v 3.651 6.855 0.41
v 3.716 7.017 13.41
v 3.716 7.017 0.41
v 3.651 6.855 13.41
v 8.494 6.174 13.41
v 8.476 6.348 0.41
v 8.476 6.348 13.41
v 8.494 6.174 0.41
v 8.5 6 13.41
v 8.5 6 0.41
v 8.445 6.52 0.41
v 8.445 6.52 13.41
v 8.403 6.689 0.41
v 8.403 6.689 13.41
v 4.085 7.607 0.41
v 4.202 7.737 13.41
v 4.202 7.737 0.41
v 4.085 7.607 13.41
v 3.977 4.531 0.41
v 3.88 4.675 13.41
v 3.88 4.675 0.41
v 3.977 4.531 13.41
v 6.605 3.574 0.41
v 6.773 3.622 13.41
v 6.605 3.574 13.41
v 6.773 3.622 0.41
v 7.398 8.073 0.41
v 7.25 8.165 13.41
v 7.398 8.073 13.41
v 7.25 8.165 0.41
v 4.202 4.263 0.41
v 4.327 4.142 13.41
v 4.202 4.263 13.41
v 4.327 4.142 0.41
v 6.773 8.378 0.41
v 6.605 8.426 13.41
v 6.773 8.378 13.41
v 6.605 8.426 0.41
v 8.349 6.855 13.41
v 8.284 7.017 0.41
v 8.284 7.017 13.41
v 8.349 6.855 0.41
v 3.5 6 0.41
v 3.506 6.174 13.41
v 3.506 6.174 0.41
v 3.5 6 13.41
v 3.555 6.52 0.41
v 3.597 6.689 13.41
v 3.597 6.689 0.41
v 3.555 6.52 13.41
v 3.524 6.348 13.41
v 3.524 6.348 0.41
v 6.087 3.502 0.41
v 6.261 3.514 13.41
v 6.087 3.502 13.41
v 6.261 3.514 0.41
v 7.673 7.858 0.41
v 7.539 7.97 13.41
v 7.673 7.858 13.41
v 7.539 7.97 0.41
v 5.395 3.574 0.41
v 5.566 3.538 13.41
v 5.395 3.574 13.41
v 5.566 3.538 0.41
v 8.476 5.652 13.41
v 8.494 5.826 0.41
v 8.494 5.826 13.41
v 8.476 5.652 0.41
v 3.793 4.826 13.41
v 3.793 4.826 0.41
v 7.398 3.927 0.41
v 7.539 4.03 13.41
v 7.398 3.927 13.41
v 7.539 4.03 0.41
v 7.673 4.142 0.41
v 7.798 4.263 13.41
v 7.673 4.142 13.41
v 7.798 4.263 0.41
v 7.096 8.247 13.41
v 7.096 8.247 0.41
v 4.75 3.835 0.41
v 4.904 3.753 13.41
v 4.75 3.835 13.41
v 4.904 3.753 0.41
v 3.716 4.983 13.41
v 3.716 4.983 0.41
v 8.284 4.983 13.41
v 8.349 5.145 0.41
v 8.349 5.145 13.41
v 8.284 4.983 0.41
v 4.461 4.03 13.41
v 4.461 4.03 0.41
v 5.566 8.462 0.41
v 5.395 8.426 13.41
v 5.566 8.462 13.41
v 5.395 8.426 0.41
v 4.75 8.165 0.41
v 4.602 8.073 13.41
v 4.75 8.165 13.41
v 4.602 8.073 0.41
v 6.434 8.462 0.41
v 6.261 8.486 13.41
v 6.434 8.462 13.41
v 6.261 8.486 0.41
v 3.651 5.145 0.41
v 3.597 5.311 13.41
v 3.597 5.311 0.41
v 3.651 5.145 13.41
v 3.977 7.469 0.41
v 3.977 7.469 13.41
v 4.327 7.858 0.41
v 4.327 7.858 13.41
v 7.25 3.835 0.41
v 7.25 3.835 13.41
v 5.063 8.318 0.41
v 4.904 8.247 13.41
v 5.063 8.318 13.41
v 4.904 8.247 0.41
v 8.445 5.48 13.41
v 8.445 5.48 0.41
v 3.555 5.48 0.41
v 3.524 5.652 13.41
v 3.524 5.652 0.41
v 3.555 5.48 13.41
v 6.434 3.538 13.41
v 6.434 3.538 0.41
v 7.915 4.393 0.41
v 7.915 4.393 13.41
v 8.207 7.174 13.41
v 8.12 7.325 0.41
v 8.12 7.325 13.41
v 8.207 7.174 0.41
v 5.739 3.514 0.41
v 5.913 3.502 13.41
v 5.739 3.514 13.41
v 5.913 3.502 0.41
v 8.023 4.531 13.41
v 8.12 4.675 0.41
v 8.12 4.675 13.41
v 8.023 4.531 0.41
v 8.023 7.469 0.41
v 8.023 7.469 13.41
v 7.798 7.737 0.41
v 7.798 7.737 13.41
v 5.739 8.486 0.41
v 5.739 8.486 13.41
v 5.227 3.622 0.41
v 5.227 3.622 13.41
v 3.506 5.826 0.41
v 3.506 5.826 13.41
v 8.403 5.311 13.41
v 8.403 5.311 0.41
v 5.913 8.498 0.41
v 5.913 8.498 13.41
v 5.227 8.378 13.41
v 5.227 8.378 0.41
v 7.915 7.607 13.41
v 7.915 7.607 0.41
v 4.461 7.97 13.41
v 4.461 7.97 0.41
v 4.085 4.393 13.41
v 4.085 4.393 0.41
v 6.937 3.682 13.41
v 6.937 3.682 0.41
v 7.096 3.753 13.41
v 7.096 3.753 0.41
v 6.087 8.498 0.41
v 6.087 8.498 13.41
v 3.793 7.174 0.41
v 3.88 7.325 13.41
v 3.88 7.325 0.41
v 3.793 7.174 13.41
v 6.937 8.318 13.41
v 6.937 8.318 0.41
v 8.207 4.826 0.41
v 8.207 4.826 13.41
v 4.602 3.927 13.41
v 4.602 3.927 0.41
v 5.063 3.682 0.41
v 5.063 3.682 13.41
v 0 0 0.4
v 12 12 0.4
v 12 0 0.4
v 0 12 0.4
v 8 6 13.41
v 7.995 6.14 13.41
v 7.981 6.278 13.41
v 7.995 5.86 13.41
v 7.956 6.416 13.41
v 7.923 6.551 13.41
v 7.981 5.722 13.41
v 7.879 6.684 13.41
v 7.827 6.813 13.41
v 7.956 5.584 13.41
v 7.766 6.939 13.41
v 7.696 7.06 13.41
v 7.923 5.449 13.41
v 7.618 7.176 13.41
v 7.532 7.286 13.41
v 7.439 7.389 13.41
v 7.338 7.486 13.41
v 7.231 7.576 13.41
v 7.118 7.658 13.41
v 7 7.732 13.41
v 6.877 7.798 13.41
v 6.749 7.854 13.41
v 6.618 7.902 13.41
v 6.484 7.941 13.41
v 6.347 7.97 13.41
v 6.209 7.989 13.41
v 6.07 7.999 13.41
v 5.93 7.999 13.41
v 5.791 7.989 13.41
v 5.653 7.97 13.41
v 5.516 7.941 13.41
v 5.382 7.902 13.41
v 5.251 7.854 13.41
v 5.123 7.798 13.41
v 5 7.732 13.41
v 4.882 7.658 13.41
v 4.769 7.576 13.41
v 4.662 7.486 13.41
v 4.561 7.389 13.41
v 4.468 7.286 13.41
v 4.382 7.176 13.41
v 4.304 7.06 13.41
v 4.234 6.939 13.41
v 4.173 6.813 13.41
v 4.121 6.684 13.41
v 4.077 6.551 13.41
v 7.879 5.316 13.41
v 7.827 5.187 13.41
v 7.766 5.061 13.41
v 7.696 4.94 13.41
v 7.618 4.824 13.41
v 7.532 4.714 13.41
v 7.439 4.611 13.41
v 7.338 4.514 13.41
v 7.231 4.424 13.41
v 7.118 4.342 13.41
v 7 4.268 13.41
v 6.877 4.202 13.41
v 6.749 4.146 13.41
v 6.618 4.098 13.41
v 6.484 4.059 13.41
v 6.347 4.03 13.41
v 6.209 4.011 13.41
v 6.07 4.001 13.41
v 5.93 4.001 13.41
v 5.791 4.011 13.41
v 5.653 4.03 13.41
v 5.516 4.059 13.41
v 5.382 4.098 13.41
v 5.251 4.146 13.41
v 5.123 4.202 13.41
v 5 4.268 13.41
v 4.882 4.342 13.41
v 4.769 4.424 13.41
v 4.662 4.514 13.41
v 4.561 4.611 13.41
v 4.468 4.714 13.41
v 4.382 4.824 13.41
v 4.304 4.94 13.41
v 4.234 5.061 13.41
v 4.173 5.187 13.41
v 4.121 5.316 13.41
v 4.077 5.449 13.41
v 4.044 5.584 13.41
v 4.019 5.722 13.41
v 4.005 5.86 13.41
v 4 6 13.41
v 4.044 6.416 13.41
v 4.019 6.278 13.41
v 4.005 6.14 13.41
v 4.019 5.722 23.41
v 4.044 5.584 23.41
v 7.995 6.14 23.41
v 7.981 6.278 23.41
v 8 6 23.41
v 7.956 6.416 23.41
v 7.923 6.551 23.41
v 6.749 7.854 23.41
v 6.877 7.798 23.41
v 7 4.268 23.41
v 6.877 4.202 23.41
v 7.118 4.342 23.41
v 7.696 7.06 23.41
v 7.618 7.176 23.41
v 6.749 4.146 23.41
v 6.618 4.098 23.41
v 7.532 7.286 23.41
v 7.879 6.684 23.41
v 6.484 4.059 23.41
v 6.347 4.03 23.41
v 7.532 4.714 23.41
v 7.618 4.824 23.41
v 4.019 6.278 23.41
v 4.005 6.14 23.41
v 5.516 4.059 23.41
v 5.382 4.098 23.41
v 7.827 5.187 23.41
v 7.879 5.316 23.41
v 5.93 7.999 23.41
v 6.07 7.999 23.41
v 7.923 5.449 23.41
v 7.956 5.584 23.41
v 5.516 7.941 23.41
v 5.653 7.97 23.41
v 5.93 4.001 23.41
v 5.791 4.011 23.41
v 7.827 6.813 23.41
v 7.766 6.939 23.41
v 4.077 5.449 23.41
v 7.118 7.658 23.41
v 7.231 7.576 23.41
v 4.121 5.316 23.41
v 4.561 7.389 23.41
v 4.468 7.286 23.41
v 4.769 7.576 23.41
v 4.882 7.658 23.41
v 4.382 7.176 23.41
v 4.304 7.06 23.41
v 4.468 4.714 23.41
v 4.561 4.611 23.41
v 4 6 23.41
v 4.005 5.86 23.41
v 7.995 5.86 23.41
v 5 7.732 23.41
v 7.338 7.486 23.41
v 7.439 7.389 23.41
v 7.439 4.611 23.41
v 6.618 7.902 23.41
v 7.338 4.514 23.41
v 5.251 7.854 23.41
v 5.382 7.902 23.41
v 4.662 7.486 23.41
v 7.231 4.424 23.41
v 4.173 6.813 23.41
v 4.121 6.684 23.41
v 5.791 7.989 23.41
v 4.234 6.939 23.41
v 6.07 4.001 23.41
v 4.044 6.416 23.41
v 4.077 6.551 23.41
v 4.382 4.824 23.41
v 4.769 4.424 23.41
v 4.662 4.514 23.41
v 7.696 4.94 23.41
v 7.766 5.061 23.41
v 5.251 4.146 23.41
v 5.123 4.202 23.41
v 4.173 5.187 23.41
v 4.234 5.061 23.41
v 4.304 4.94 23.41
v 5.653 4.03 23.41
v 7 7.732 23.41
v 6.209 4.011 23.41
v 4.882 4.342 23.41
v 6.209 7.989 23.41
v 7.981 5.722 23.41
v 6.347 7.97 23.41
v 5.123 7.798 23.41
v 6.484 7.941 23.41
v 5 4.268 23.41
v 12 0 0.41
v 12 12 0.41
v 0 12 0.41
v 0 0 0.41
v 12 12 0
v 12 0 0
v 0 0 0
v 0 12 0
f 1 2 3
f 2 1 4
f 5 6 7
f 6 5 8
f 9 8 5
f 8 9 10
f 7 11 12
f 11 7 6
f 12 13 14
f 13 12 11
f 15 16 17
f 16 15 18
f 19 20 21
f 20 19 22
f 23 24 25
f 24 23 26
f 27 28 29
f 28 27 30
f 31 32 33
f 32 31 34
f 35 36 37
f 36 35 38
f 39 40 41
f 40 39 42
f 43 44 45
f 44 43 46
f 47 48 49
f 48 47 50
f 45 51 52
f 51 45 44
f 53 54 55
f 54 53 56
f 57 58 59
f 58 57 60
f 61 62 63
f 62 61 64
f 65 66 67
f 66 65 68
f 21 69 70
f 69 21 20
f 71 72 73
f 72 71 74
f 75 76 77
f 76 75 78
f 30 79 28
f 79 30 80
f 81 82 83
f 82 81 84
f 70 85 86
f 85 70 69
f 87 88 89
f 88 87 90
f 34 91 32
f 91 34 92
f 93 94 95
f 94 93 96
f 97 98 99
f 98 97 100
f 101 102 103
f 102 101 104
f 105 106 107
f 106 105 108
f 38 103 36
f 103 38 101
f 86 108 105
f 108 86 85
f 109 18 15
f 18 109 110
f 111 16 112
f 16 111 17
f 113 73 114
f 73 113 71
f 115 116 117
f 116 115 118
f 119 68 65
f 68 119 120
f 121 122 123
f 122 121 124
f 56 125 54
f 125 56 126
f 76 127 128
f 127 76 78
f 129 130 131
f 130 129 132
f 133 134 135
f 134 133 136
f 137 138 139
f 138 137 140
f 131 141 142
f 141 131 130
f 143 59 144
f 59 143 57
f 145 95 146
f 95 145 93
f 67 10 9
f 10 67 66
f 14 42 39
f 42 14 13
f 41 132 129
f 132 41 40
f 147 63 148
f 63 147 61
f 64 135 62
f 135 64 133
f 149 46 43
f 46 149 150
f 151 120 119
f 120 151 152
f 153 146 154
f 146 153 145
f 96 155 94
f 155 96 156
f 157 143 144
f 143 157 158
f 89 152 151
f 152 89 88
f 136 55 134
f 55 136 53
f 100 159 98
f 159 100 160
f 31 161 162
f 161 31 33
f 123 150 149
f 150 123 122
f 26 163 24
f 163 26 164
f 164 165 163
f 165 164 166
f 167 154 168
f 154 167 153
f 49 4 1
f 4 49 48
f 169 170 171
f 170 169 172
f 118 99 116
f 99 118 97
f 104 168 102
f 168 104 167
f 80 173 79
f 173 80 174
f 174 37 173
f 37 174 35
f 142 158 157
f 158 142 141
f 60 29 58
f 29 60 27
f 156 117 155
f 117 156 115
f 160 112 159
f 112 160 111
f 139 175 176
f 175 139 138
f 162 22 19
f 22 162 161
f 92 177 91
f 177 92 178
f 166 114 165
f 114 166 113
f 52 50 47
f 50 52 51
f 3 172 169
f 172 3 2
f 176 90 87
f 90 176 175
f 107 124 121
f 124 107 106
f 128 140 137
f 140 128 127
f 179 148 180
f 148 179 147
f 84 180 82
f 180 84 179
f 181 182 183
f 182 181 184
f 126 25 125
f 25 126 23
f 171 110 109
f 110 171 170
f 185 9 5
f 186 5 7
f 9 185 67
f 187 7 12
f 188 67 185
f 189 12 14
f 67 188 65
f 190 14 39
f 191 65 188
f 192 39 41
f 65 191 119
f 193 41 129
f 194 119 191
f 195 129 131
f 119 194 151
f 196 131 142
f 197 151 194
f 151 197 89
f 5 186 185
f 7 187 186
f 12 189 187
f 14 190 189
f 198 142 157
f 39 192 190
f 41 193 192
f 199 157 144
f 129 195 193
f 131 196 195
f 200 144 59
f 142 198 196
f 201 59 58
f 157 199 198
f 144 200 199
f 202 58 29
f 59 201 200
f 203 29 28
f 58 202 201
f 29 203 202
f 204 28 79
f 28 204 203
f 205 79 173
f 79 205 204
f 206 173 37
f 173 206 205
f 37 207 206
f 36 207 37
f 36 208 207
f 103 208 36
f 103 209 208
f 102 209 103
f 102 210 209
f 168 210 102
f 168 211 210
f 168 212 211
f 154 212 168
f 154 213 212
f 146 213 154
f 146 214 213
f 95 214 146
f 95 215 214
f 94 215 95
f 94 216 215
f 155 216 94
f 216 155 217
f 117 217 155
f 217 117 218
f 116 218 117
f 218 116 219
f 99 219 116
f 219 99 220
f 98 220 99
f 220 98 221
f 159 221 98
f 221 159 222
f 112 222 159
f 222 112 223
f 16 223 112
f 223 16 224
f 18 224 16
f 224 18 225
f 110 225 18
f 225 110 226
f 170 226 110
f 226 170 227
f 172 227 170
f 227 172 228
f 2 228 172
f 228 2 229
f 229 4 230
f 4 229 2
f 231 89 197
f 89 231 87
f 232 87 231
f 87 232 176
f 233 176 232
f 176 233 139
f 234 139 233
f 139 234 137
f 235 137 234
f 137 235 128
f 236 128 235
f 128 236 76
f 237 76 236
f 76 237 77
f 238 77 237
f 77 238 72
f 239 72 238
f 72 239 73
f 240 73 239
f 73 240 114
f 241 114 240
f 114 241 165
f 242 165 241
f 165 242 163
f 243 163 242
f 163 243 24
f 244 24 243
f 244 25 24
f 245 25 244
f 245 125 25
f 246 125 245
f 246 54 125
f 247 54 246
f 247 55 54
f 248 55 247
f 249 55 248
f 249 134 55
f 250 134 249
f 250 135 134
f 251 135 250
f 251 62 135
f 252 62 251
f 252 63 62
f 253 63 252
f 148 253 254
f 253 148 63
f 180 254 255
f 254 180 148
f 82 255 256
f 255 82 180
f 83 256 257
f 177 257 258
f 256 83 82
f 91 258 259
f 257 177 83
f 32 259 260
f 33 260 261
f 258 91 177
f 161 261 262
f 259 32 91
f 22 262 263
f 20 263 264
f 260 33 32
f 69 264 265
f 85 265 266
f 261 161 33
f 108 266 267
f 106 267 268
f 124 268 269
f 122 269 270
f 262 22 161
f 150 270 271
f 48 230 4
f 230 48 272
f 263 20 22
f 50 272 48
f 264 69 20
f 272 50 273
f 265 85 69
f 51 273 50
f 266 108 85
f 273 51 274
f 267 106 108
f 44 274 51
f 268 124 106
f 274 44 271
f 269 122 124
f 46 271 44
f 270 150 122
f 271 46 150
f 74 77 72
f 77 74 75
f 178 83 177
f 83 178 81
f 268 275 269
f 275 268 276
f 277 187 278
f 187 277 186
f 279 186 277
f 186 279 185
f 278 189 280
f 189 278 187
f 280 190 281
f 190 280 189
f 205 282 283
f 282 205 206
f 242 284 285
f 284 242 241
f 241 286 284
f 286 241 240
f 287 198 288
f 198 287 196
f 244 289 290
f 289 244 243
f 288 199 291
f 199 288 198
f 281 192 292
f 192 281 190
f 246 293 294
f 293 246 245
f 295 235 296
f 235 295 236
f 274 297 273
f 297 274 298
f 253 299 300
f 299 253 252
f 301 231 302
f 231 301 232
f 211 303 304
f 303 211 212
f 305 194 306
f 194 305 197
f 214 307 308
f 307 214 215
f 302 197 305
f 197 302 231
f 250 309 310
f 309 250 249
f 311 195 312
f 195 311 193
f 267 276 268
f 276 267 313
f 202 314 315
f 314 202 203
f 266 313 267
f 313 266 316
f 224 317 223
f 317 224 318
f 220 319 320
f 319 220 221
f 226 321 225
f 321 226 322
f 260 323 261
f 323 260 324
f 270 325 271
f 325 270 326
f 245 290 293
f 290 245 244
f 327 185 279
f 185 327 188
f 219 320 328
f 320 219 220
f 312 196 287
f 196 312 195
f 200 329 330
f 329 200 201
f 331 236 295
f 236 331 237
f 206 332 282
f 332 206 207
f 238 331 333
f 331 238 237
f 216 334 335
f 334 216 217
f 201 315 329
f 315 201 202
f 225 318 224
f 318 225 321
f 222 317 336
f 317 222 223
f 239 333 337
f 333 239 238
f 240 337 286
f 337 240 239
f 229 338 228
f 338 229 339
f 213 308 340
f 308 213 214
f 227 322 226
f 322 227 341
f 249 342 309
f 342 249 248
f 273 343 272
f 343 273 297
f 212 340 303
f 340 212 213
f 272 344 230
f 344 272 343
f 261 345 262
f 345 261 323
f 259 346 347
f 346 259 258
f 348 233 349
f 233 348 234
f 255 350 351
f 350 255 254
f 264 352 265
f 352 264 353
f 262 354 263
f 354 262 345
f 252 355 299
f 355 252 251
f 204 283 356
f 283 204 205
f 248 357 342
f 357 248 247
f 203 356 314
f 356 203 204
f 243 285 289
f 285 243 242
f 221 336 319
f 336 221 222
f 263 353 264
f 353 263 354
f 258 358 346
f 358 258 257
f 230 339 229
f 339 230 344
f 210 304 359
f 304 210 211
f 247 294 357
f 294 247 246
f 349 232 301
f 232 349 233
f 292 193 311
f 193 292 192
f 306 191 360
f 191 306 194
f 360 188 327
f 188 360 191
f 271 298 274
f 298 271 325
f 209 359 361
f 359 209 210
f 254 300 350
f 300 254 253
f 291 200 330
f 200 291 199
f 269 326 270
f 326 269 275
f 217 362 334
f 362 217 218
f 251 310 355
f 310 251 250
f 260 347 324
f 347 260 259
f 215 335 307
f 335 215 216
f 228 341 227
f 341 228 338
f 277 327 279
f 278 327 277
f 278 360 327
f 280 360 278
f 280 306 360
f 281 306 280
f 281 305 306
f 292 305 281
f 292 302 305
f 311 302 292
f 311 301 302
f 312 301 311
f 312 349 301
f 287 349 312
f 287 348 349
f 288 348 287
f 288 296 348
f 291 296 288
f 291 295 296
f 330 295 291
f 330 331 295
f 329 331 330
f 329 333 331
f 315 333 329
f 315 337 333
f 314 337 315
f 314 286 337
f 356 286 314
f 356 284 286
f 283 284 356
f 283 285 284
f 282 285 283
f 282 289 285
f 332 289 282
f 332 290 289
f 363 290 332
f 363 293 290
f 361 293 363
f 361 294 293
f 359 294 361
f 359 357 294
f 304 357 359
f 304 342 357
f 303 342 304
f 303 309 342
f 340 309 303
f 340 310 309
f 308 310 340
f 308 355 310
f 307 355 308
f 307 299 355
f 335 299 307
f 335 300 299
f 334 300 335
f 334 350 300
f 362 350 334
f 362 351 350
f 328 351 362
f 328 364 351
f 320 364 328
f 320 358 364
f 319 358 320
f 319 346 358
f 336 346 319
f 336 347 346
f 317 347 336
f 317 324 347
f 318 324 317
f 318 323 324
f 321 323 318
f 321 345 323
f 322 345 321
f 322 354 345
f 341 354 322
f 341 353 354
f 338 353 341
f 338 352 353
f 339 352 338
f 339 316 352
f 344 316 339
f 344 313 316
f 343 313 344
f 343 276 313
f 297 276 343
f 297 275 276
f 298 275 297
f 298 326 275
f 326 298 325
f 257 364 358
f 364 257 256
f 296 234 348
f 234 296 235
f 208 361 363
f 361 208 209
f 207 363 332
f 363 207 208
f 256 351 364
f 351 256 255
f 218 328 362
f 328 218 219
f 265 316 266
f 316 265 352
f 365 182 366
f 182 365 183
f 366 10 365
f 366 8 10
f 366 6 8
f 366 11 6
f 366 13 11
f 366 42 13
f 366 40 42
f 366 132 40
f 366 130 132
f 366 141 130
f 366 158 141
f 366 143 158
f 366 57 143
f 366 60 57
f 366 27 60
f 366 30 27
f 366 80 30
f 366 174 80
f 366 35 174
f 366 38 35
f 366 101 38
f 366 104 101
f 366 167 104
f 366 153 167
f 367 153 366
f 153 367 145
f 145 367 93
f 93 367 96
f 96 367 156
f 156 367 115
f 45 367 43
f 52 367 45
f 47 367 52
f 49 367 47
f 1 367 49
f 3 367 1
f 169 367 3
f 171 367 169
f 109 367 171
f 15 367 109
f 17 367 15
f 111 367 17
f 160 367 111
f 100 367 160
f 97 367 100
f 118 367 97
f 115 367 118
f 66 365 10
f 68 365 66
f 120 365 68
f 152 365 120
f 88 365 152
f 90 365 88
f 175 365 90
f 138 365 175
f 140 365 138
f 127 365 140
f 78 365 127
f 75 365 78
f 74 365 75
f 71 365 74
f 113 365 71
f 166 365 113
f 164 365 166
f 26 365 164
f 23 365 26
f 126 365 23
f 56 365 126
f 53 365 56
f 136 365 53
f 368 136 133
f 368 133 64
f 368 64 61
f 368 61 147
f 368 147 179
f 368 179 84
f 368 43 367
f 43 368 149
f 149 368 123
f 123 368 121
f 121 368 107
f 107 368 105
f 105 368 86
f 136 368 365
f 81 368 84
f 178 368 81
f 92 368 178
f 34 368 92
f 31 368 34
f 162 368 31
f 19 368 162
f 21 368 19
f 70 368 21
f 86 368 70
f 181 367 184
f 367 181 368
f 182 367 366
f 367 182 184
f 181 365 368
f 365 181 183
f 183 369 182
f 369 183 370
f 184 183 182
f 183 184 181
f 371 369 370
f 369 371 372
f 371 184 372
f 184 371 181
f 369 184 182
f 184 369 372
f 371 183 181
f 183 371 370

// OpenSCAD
// file: ../../Base/Boxes.scad
// Fischertechnik Box Foundation
// Pre-designed Boxes

use <Constants.scad>

include <PlacementOptions.scad>

box190Width = 190;
box190Depth = 130;
box130Width = 130;
box130Depth = 95;
boxUsageHeight = 33.9;
boxWallThickness = 2.4;
boxBaseThickness = 1.0;
boxWebWidth = 3.0;

// getBoxWallThickness()
// Gets the wall thickness of a Fischertechnik Box

function getBoxWallThickness() = boxWallThickness;

// Gets the usable height of a fischertechnik box
function getBoxUsageHeight() = boxUsageHeight;

// Gets the thickness of the Fischertechnik box base.
function getBoxBaseThickness() = boxBaseThickness;

// Gets the width of a box web
function getBoxWebWidth() = boxWebWidth;

// Gets the usable inner space of a Box 190 as an x/y-list
function getBox190Space() = [
    box190Width - 2*getBoxWallThickness(), 
    box190Depth - 2*getBoxWallThickness() ];

// Imports the Fischertechnik empty box 130x190 mm and places it at position 0,0
// 190x130 are the outer sizes, the inner space is slightly smaller. Use getBox190Space() to get the inner sizes.
// This module needs the STL file "Fischertechnik Box 130x190.stl" in the library path.
// The box is positioned that the usable inner space is at the 0,0,0 position. The

module Box190() {
    translate([-getBoxWallThickness(),-getBoxWallThickness(),-getBoxBaseThickness()])
        import("Fischertechnik Box 130x190.stl", convexity=3);
}

// Gets the usable inner space of a Box 130 as an x/y-list
function getBox130Space() = [
    box130Width - 2*getBoxWallThickness(), 
    box130Depth - 2*getBoxWallThickness() ];

// Imports the Fischertechnik empty box 95x130 mm and places it at position 0,0
// 190x130 are the outer sizes, the inner space is slightly smaller. Use getBox190Space() to get the inner sizes.
// This module needs the STL file "Fischertechnik Box 95x130.stl" in the library path.
// The box is positioned that the usable inner space is at the 0,0,0 position. The

module Box130() {
    translate([-getBoxWallThickness(),-getBoxWallThickness(),-getBoxBaseThickness()])
        import("Fischertechnik Box 95x130.stl", convexity=3);
}

// Creates a web at the specified box walls
// corner 0 = LowerLeft, 1 = UpperLeft, 2 = UpperRight, 3 = LowerRight
// side 0 = LeftOfCorner, 1 = RightOfCorner
// distance = Distance in mm from the corner
// box = inner width and depth of the box (default: Box 190)
// webWidth = length of the web (default is 3 mms)
// webThickness = thickness of the web (default is 1 mm)

module BoxWeb(corner, side, distance, box=getBox190Space(), webWidth=getBoxWebWidth(), webThickness=1.0) {
    sink = getBoxWallThickness()/2;

    width = (corner % 2 == 0) ? 
            (side == LeftOfCorner ? webWidth : webThickness) :
            (side == LeftOfCorner ? webThickness : webWidth);

    depth = (corner % 2 == 0) ? 
            (side == RightOfCorner ? webWidth : webThickness) :
            (side == RightOfCorner ? webThickness : webWidth);
    
    xDiff = corner == LowerLeft ? 
                (side == LeftOfCorner ? -sink : distance) :
            (corner == UpperLeft ?                
                (side == LeftOfCorner ? distance : -sink) :
            (corner == UpperRight ?
                (side == LeftOfCorner ? box.x-webWidth+sink : box.x-distance-webThickness) :
                (side == LeftOfCorner ? box.x-distance-webThickness: box.x-webWidth+sink)));

    yDiff = corner == LowerLeft ? 
                (side == RightOfCorner ? -sink : distance) :
            (corner == UpperLeft ?
                (side == RightOfCorner ? box.y-distance : box.y-webWidth+sink) :
            (corner == UpperRight ?
                (side == RightOfCorner ? box.y-webWidth+sink : box.y-distance) :
                (side == RightOfCorner ? distance : -sink)));
    
    translate([xDiff, yDiff, -getExcess()])
        cube([width, depth, boxUsageHeight + 2*getExcess()]);
}
// file: ../../Base/Rotation.scad
// Fischertechnik Box Foundation
// Geometry Helpers Rotation

include <PlacementOptions.scad>

// getRotatedSpace(space, rotation=NoRotation)
// Rotates the space dependent on the specified rotation

function getRotatedSpace(space, rotation=NoRotation) = [
    (rotation == Rotate90 || rotation == Rotate270) ? space.y : space.x,
    (rotation == Rotate90 || rotation == Rotate270) ? space.x : space.y
];

// Rotates the given space around the fixed left lower corner
// space = the space the children needs as width/depth list [width,depth]
// rotation = 0 Rotate0 degrees, 1 Rotate90 degrees, 2 Rotate180 degrees, 3 Rotate270 degrees (equivalent to -90)

module RotateFix(space, rotation=Rotate0) {
    dy = (rotation == Rotate0 || rotation == Rotate270) ? 0 :
        (rotation == Rotate90) ? space.x :
        space.y;
    dx = (rotation < Rotate180) ? 0 :
        (rotation == Rotate180) ? space.x :
        space.y;
    
    translate([dx, dy, 0])
        rotate([0, 0, rotations[rotation]])
            children();
}
// file: ../../Base/Alignment.scad
// Fischertechnik Box Foundation
// Geometry Helpers Alignment

include <PlacementOptions.scad>

// getAlignedX(elementWidth, spaceWidth, align=AlignRight, offset=0)
// Gets the aligned X offset of an element with the given
// width in the given space.
// elementWidth = The width of the element to positon
// spaceWidth = The space where the element should be aligned
// align = 0 AlignLeft, 1 AlignCenter, 2 AlignRight
// offset = an optional offset from the aligned position. When
// aligned left or centered, then positive values are in X direction.
// When aligned right then positive values are in negative X direction.

function getAlignedX(elementWidth, spaceWidth, align=AlignRight, offset=0) =
    (align == AlignLeft) ?
        offset :
        ((align == AlignCenter) ?
        (spaceWidth - elementWidth)/2 + offset :
        spaceWidth - offset - elementWidth);

// getAlignedY(elementDepth, spaceDepth, align=AlignTop, offset=0)
// Gets the aligned Y offset of an element with the given
// depth in the given space.
// elementDepth = The depth of the element to positon
// spaceDepth = The space where the element should be aligned
// align = 0 AlignBottom, 1 AlignCenter, 2 AlignTop
// offset = an optional offset from the aligned position. When
// aligned bottom or centered, then positive values are in Y direction.
// When aligned top then positive values are in negative Y direction.

function getAlignedY(elementDepth, spaceDepth, align=AlignTop, offset=0) =
    (align == AlignBottom) ?
        offset :
        ((align == AlignCenter) ?
        (spaceDepth - elementDepth)/2 + offset :
        spaceDepth - offset - elementDepth);
// file: ../../Base/PlacementOptions.scad
// Fischertechnik Box Foundation
// Placement Options

// Alignment
NoAlign = 0;
AlignLeft = 1;
AlignBottom = 2;
AlignCenter = 3;
AlignRight = 4;
AlignTop = 5;

// Element rotation degree steps
rotations = [0, -90, -180, -270];

// Rotation
NoRotation = 0;
Rotate0 = 0;
Rotate90 = 1;
Rotate180 = 2;
Rotate270 = 3;

// Docking (seen from above)
NoDock = -1;
DockLeft = 0;
DockTop = 1;
DockRight = 2;
DockCorner = 2;
DockBottom = 3;

// Web corners
LowerLeft = 0;
UpperLeft = 1;
UpperRight = 2;
LowerRight = 3;

// Web position relative to corner
LeftOfCorner = 0;
RightOfCorner = 1;
// file: ../../Base/Placement.scad
// Fischertechnik Box Foundation
// Geometry Helpers Placement

use <Constants.scad>
use <Alignment.scad>
use <Rotation.scad>
use <Boxes.scad>

include <PlacementOptions.scad>

// Place(x=0, y=0, elementSpace=[0,0], alignX=AlignLeft, alignY=AlignBottom, rotation=Rotate0, boxSpace=getBox190Space())
// Places the child at the specified position
// y = Y-Position. This is a relative position when an X aligment is specified.
// x = X-Position. This is a relative position when an Y aligment is specified.
// elementSpace = space of the element to be placed [x,y]
// alignX = -1=NoAlign, 0 AlignLeft, 1 AlignCenter, 3 AlignRight (elementSpace and boxSpace required!)
// alignY = -1=NoAlign, 2 AlignBottom, 1 AlignCenter, 4 AlignTop (elementSpace and boxSpace required!)
// rotation = 0 Rotate0 0 degrees, 1 Rotate90 90 degrees, 
// 2 Rotate180 180 degrees, 3 Rotate270 270 degrees (equivalent to -90)
// boxSpace = Inner space of the box where the placement occurs [x,y] - default is Box 190x130 inner space

module Place(x=0, y=0, elementSpace=[0,0], 
  alignX=AlignLeft, alignY=AlignBottom, 
  rotation=NoRotation, boxSpace=getBox190Space()) {

    module Position(x, y, space, rotation=Rotate0) {
        translate([x, y, 0])
            RotateFix(space, rotation)
                children();
    }

    space = getRotatedSpace(elementSpace, rotation);
    alignedX = getAlignedX(space.x, boxSpace.x, alignX, x);
    alignedY = getAlignedY(space.y, boxSpace.y, alignY, y);
    Position(alignedX, alignedY, elementSpace, rotation)
        children();
}

// Center(space=getBox130Space(), elementSpace=[0,0])
// space = Space where the children is centered. For cylinder use centered=true and no elementSpace.
// elementSpace = space of the element to be centered [x,y]

module Center(space=getBox190Space(), elementSpace=[0,0]) {
    translate([(space.x - elementSpace.x) / 2, (space.y - elementSpace.y) / 2])
        children(0);
}

// CenterHorizontal(width=0, y=0, offset=0, space=getBox130Space())
// space = Space where the children is centered. For cylinder use centered=true and no elementSpace.
// elementSpace = space of the element to be centered [x,y]

module CenterHorizontal(width=0, y=0, offset=0, space=getBox190Space()) {
    translate([(space.x - width) / 2 + offset, y])
        children(0);
}

// CenterVertical(depth=0, x=0, offset=0, space=getBox130Space())
// space = Space where the children is centered. For cylinder use centered=true and no elementSpace.
// elementSpace = space of the element to be centered [x,y]

module CenterVertical(depth=0, x=0, offset=0, space=getBox190Space()) {
    translate([x, (space.y - depth) / 2 + offset])
        children(0);
}
// file: ../../Base/Constants.scad
// Fischertechnik Box Foundation
// Constants

// Constant values necessary for multiple elements

// Base constants
dividerThickness = 1.2;
excess = 0.01;
fragments = 90;
tolerance = 0.8;

// Gets the thickness of a divider 
function getDividerThickness() = dividerThickness;

// Gets the excess that is used to merge walls into each other
function getExcess() = excess;

// Gets amount of fragments of a cylinder
function getFragments() = fragments;

// Gets the inner tolerance of a frame to each side
function getTolerance() = tolerance;


// Fischertechnik specific constants
axisDiameter = 4;
axisBottomDiameter = axisDiameter + 1;
standardEdgeDistance = 2.5;
standardWebDistance = 11.5;
standardCornerLength = 15;
tubeWallFactor = 0.8;

// Gets axis diameter
function getAxisDiameter() = axisDiameter;

// Gets axis bottom diameter for thicker part at the bottom
function getAxisBottomDiameter() = axisBottomDiameter;

// gets the standard distance to the wall of the box for dockable frames with webs
function getStandardEdgeDistance() = standardEdgeDistance;

// gets the standard distance of each web to the corner of the dockable frame
function getStandardWebDistance() = standardWebDistance;

// gets the standard length of the corner walls of a dockable frame
function getStandardCornerLength() = standardCornerLength;

// gets the wall thickness of a tube.
function getTubeWallThickness() = tubeWallFactor * getDividerThickness();
// file: ../../Elements/AxisClip10.scad
// Fischertechnik Box Library
// Axis for clip 10
// 31023

use <../ModelBase/Simple.scad>

width = 12;
depth = 12;
height = 23;

// getAxisClip10Space()
// Gets the space of a frame for a clip 10 with spring ring (mot2)

function getAxisClip10Space() = [width, depth, height];

// AxisClip10()
// Axis for clip 10 with spring ring (mot2)

module AxisClip10() {
    LeveledAxisWithSpace(height, height-10, getAxisClip10Space());
}

// Tests
color("lightgray")
AxisClip10();
// file: ../TestPrint.scad
// 3D Print Test Base

use <../Base/Constants.scad>

use <../Elements/AxisClip10.scad>

module TestPrint(elementSpace) {
    cube([elementSpace.x, elementSpace.y, 0.4]);
    translate([0,0,0.4+getExcess()]) {
        children();
    }
}

TestPrint(getAxisClip10Space())
    AxisClip10();
// main file
// 3D Print Test
// AxisClip10

use <../TestPrint.scad>
use <../../Elements/AxisClip10.scad>

TestPrint(getAxisClip10Space())
    AxisClip10();
